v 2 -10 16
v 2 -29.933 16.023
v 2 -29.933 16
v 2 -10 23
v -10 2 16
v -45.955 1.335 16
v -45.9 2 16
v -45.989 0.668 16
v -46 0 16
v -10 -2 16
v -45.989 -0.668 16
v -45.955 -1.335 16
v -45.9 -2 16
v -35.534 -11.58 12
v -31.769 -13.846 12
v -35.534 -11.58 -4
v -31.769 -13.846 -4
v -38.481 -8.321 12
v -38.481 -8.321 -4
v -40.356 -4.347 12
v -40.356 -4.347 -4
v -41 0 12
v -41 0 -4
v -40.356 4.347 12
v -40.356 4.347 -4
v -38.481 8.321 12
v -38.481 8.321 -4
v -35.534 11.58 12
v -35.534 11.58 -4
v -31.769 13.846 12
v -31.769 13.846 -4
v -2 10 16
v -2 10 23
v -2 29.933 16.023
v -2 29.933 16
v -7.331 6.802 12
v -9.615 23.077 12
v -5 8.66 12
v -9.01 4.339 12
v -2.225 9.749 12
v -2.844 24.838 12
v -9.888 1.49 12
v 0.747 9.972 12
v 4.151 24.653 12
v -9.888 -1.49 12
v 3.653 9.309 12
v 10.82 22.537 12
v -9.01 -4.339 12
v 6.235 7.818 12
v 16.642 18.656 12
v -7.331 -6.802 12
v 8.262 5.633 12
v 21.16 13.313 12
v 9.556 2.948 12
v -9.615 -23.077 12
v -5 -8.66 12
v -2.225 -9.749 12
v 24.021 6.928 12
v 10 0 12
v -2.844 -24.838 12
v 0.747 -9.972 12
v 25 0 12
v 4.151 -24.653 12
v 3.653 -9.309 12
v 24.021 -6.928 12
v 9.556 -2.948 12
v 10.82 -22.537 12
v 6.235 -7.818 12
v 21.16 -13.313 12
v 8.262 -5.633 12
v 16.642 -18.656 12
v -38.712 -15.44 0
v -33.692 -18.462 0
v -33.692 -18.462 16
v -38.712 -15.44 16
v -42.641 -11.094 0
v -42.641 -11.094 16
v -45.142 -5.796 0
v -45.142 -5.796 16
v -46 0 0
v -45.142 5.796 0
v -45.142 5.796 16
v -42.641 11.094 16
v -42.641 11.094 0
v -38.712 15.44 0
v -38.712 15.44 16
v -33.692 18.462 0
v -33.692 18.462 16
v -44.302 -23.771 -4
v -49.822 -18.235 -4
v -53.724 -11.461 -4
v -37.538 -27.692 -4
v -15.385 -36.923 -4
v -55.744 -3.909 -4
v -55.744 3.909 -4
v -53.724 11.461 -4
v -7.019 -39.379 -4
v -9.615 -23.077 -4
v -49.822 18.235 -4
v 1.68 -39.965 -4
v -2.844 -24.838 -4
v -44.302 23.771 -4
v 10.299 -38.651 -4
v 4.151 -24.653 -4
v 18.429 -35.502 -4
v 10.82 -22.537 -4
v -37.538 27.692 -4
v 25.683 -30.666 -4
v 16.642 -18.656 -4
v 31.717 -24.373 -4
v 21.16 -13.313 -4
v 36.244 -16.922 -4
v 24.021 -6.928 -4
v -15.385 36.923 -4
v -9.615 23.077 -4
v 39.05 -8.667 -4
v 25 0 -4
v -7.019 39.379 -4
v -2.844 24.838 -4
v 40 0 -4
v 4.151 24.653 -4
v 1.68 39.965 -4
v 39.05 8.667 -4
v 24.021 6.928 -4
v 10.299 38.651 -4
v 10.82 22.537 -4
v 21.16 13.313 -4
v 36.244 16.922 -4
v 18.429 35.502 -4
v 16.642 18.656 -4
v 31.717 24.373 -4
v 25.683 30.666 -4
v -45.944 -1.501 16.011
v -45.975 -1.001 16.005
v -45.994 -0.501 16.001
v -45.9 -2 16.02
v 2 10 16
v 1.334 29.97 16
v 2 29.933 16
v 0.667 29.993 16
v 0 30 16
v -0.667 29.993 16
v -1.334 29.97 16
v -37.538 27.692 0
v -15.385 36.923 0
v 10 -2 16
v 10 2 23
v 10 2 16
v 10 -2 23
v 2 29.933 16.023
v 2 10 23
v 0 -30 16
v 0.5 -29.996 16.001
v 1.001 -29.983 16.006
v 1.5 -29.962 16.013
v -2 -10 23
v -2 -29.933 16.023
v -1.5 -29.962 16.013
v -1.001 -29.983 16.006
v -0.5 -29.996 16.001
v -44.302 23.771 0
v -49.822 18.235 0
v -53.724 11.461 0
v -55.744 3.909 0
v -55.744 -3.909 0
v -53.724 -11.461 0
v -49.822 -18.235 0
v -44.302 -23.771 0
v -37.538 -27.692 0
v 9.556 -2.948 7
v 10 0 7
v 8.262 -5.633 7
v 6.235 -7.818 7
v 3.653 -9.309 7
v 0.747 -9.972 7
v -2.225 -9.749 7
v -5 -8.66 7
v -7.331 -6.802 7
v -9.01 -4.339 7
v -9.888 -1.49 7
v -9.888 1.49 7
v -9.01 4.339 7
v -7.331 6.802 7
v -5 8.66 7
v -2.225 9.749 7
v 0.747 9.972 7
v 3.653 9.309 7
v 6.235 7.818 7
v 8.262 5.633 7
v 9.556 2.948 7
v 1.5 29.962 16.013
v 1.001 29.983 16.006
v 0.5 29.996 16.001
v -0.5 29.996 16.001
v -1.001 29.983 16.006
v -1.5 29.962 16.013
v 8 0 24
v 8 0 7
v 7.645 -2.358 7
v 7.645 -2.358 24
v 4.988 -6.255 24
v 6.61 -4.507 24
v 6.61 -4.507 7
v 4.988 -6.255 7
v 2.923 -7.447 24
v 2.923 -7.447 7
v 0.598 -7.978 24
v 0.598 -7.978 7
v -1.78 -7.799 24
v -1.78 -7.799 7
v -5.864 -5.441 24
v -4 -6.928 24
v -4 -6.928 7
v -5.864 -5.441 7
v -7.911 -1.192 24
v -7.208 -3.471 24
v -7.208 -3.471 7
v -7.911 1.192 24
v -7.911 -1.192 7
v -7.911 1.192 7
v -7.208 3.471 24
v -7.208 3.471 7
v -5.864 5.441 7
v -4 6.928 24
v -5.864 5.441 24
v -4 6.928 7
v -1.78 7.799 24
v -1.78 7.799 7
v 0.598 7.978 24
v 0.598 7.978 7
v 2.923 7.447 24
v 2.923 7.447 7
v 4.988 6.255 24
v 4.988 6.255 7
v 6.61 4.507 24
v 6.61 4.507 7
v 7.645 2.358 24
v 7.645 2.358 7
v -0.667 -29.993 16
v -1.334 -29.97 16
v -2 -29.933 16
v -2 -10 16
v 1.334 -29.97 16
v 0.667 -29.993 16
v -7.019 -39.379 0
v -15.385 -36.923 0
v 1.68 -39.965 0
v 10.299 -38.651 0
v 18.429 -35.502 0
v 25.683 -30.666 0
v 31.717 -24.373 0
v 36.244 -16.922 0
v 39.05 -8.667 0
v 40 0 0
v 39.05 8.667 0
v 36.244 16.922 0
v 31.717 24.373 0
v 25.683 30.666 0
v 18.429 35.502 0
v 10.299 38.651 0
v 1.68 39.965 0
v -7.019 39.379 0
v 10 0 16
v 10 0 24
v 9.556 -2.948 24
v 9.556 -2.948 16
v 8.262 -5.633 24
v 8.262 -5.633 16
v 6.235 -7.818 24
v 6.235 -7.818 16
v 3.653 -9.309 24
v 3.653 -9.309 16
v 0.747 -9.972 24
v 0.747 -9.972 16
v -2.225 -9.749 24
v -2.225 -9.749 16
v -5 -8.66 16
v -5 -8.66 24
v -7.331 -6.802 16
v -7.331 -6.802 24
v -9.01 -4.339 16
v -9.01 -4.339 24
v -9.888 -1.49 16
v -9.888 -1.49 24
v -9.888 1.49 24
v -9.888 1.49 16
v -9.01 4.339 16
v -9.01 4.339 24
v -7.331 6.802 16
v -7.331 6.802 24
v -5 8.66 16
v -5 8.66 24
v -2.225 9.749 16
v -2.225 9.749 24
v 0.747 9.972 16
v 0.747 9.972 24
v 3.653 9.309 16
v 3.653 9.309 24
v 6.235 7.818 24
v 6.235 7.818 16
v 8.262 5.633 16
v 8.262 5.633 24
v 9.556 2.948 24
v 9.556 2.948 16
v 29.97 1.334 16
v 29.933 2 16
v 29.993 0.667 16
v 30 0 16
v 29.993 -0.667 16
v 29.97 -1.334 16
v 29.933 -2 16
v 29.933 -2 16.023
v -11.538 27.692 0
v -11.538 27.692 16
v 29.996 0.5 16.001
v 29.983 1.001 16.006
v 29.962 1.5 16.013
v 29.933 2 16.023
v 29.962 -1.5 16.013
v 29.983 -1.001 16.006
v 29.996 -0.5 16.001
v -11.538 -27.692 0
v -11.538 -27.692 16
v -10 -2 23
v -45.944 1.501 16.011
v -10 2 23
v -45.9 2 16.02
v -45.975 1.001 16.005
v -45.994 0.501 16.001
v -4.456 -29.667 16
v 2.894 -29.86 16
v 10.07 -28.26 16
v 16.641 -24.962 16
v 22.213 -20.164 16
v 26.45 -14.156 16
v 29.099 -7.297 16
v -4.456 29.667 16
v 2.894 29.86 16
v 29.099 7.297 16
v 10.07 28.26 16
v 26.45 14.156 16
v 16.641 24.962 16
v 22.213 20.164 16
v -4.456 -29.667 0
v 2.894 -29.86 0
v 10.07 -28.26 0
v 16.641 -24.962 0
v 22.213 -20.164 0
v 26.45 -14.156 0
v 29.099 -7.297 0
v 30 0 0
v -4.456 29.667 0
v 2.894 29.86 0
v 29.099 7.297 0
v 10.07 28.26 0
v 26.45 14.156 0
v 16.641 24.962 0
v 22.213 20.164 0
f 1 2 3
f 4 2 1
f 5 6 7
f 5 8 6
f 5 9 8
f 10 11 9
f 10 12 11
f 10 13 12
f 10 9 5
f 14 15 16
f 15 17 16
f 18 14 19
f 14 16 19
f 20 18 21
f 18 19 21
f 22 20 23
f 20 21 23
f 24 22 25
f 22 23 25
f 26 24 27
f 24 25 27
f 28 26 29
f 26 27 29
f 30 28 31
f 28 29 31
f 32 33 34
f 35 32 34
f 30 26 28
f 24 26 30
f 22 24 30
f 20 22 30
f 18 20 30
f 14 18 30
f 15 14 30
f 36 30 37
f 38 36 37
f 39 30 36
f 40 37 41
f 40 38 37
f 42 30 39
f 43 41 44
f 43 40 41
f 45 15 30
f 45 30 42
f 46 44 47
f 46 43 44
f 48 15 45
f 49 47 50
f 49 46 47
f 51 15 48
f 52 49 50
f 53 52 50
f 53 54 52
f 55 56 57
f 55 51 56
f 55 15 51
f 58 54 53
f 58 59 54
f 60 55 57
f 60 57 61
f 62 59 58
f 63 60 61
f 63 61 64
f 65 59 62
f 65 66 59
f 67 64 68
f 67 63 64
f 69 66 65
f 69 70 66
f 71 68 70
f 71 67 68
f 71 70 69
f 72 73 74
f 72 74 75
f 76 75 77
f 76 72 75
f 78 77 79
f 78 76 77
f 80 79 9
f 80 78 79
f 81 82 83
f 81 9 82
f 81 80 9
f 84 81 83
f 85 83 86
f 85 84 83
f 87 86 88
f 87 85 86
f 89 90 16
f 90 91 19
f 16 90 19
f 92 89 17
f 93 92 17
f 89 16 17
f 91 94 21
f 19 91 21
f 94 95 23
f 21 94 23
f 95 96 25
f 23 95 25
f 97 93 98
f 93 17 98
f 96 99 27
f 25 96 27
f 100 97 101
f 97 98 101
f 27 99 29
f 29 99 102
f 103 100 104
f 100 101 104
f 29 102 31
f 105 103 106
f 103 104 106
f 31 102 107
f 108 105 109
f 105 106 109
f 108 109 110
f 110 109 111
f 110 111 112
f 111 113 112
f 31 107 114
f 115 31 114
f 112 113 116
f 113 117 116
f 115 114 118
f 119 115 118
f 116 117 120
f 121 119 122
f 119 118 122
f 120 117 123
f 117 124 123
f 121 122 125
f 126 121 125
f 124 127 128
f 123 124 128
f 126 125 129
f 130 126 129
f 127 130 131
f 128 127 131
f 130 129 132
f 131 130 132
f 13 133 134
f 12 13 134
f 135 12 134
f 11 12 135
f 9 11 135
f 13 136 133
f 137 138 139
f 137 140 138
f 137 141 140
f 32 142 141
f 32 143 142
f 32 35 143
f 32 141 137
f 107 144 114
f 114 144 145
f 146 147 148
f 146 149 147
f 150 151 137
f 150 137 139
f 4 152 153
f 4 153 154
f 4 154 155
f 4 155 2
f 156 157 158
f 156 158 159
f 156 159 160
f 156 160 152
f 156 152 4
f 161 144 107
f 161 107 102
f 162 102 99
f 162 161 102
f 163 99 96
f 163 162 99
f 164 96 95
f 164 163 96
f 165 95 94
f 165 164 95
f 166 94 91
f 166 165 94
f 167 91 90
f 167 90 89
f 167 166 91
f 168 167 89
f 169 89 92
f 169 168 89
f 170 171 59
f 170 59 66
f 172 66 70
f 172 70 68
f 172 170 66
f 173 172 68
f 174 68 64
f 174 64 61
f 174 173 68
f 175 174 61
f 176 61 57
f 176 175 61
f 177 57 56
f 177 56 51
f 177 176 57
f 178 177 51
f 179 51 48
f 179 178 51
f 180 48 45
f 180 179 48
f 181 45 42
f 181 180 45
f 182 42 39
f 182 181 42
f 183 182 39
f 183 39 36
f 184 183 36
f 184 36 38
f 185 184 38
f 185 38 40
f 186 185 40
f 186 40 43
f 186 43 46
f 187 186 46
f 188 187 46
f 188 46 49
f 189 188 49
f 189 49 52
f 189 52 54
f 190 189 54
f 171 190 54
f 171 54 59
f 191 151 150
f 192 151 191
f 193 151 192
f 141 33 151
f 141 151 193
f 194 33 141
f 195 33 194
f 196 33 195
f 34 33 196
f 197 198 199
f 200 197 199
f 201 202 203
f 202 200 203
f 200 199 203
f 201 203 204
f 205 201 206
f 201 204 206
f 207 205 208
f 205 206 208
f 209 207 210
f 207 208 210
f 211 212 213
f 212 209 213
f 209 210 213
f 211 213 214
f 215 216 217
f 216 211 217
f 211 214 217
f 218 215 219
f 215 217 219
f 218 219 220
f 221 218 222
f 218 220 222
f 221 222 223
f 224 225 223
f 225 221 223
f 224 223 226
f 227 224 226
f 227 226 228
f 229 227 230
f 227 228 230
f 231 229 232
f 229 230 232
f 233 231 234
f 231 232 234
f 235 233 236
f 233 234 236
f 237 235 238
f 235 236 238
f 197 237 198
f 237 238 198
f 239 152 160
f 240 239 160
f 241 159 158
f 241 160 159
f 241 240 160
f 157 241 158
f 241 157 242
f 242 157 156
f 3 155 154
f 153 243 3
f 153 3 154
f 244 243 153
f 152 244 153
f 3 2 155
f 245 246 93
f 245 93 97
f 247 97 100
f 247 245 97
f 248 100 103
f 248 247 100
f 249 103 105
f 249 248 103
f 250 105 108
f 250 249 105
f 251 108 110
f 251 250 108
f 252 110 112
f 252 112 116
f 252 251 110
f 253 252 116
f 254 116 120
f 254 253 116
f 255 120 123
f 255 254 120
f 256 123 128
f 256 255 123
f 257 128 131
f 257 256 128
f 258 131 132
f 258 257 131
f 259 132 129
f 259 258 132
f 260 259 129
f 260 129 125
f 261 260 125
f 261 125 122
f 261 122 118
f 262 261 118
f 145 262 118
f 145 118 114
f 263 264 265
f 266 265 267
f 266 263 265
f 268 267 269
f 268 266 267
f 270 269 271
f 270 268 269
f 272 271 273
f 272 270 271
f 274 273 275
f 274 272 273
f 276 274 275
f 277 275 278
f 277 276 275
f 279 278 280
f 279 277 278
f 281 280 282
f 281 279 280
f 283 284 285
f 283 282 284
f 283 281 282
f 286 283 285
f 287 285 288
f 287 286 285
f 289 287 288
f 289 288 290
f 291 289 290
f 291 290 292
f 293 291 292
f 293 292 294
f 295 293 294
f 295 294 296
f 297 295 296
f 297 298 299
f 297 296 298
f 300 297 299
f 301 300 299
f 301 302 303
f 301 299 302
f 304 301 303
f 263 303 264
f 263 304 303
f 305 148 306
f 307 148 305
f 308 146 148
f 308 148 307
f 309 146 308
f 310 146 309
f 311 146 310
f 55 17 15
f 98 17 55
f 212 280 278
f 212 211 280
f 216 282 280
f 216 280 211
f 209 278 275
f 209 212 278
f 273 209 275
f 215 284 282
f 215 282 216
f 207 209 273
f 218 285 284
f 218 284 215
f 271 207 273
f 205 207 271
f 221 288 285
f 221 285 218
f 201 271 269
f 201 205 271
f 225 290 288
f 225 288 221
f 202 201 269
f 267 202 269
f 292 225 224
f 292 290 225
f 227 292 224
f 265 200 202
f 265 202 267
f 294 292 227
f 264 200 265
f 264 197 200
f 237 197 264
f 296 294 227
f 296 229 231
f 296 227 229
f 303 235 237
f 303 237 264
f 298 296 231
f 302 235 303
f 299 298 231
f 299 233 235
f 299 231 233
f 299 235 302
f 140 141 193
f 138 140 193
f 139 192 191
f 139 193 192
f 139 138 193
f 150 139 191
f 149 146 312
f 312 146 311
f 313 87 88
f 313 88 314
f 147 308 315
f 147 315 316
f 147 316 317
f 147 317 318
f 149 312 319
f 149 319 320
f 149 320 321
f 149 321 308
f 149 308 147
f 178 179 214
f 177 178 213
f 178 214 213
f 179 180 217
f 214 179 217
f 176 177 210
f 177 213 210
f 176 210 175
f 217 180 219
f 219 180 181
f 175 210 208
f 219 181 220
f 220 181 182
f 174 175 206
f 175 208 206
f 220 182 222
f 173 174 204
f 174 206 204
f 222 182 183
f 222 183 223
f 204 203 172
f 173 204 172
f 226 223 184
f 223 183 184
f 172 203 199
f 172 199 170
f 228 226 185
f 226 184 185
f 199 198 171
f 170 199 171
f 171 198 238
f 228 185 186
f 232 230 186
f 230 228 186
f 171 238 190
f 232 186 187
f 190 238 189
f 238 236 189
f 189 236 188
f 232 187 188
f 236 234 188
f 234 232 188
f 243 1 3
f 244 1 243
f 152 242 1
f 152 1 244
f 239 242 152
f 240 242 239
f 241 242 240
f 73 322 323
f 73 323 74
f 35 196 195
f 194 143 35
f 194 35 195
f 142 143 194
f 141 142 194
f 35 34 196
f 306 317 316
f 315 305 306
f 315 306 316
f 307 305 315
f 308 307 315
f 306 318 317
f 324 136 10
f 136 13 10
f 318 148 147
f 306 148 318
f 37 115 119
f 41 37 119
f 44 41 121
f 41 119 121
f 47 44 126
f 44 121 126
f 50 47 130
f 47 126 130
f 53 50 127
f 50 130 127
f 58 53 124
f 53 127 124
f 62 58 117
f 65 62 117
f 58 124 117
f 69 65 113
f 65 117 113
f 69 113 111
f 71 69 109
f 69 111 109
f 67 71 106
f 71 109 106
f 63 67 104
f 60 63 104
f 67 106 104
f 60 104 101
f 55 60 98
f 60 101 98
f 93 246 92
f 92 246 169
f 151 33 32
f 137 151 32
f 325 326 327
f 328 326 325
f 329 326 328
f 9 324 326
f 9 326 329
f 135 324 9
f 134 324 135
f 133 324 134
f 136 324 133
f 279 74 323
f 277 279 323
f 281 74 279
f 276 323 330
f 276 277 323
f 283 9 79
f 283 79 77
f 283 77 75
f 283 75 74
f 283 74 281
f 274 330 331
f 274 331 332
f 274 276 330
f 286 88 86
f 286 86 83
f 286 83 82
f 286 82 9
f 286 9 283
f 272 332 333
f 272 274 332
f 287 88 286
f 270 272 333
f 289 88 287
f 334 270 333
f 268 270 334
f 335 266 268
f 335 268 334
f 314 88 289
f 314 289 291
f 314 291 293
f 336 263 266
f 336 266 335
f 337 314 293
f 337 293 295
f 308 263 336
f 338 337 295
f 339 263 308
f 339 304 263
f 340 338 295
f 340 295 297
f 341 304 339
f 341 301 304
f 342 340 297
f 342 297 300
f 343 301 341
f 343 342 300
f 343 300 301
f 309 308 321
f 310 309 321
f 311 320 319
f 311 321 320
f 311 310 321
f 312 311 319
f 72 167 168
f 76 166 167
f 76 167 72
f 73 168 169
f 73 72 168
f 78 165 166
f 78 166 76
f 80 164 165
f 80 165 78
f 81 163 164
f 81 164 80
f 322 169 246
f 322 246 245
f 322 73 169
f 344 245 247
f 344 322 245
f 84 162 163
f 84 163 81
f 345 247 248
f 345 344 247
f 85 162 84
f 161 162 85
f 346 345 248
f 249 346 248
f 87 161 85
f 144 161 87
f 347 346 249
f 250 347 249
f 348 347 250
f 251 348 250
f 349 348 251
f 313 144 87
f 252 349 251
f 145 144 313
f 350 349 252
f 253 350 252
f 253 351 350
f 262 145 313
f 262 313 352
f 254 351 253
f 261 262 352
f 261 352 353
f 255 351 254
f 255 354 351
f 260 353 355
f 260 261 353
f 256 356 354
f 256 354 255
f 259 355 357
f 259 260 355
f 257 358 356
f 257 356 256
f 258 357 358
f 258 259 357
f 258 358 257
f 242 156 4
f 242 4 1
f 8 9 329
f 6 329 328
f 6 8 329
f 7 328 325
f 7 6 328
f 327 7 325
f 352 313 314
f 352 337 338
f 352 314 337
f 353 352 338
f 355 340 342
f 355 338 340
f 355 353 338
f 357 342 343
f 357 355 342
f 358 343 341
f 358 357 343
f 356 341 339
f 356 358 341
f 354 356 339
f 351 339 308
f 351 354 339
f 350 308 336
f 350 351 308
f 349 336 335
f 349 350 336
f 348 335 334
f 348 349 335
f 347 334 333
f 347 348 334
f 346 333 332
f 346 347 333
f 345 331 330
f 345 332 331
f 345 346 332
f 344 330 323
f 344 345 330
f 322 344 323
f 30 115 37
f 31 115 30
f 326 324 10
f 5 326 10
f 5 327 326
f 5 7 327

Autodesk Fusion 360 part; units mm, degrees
sketch "草图1" plane through (0, 0, 0) normal (0, 0, 1) x (1, 0, 0)
  line L0 (-140, 0) -> (100, 0) construction
  circle A0 centre (0, 0) radius 8
  circle A1 centre (0, 0) radius 10
  line L1 (-37.5385, 27.6923) -> (-15.3846, 36.9231)
  line L2 (-15.3846, -36.9231) -> (-37.5385, -27.6923)
  arc A2 (-37.5385, 27.6923) -> (-37.5385, -27.6923) centre (-26, 0) ccw
  line L3 (-33.6923, 18.4615) -> (-11.5385, 27.6923)
  line L4 (-11.5385, -27.6923) -> (-33.6923, -18.4615)
  arc A3 (-33.6923, 18.4615) -> (-33.6923, -18.4615) centre (-26, 0) ccw
  arc A4 (-11.5385, -27.6923) -> (-11.5385, 27.6923) centre (0, 0) ccw
  arc A5 (-15.3846, -36.9231) -> (-15.3846, 36.9231) centre (0, 0) ccw
  dimension "d1" = 20
  dimension "d2" = 16
  dimension "d3" = 80
  dimension "d4" = 60
  dimension "d5" = 60
  dimension "d6" = 40
  dimension "d7" = 26
extrude "拉伸1" add sketch "草图1" against normal blind 4 contours A1 | L1 L2 A2 A5 | L3 L4 A3 A4 makes body 1
extrude "拉伸2" add sketch "草图1" along normal blind 16 contours A1 | L3 L4 A3 A4 bodies 1
extrude "拉伸3" add sketch "草图1" along normal blind 24 contours A1 bodies 1
sketch "草图2" plane through (0, 0, -4) normal (0, 0, -1) x (1, 0, 0)
  circle A0 centre (0, 0) radius 8
  arc A1 (-37.5385, 27.6923) -> (-37.5385, -27.6923) centre (-26, 0) ccw
  line L0 (-37.5385, -27.6923) -> (-15.3846, -36.9231)
  arc A2 (-15.3846, -36.9231) -> (-15.3846, 36.9231) centre (0, 0) ccw
  line L1 (-15.3846, 36.9231) -> (-37.5385, 27.6923)
  circle A3 centre (0, 0) radius 8
  circle A4 centre (0, 0) radius 10
  line L2 (-31.7692, 13.8462) -> (-9.6154, 23.0769)
  line L3 (-9.6154, -23.0769) -> (-31.7692, -13.8462)
  arc A5 (-31.7692, 13.8462) -> (-31.7692, -13.8462) centre (-26, 0) ccw
  arc A6 (-9.6154, -23.0769) -> (-9.6154, 23.0769) centre (0, 0) ccw
  line L4 (-66, 0) -> (45, 0) construction
  dimension "d14" = 50
  dimension "d15" = 30
  dimension "d16" = 20
  dimension "d17" = 16
  dimension "d18" = 26
extrude "拉伸4" cut sketch "草图2" against normal blind 16 contours L2 L3 A5 A6 bodies 1
extrude "拉伸5" cut 1 faces at (9.2663, 0.8943, -4) along direction (0, 0, 1) blind 11 on bodies 1 bodies 1
sketch "草图3" plane through (0, 0, 0) normal (0, 1, 0) x (1, 0, 0)
  line L0 (-10, -24) -> (10, -24)
  line L1 (10, -24) -> (10, -23)
  line L2 (10, -23) -> (-10, -23)
  line L3 (-10, -23) -> (-10, -24)
  line L4 (-10, -23) -> (-46, -16)
  line L5 (-46, -16) -> (30, -16)
  line L6 (30, -16) -> (10, -23)
  line L7 (-10, -23) -> (-10, -16)
  line L8 (10, -23) -> (10, -16)
  dimension "d23" = 1
  dimension "d24" = 20
extrude "拉伸6" add sketch "草图3" along normal mid plane 4 separate body contours L4 L5 L7 | L5 L6 L8 makes body 2 at (16.6667, 0.6667, 20.6667) makes body 3 at (-34, 0.6667, 18.3333)
sketch "草图4" plane through (0, 0, 0) normal (1, 0, 0) x (0, 1, 0)
  line L0 (-10, 24) -> (10, 24)
  line L1 (10, 24) -> (10, 23)
  line L2 (10, 23) -> (30, 16)
  line L3 (30, 16) -> (-30, 16)
  line L4 (-30, 16) -> (-10, 23)
  line L5 (-10, 23) -> (-10, 24)
  line L6 (-10, 23) -> (-10, 16)
  line L7 (10, 23) -> (10, 16)
extrude "拉伸7" add sketch "草图4" along normal mid plane 4 separate body contours L3 L4 L6 | L2 L3 L7 makes body 4 at (0.6667, 23.3333, 18.3333) makes body 5 at (0.6667, -16.6667, 20.6667)
extrude "拉伸8" cut 1 faces at (-17.8311, -17.2623, 16) along direction (0, 0, 1) blind 18 keep common part on bodies 1 bodies 2 3 4 5
